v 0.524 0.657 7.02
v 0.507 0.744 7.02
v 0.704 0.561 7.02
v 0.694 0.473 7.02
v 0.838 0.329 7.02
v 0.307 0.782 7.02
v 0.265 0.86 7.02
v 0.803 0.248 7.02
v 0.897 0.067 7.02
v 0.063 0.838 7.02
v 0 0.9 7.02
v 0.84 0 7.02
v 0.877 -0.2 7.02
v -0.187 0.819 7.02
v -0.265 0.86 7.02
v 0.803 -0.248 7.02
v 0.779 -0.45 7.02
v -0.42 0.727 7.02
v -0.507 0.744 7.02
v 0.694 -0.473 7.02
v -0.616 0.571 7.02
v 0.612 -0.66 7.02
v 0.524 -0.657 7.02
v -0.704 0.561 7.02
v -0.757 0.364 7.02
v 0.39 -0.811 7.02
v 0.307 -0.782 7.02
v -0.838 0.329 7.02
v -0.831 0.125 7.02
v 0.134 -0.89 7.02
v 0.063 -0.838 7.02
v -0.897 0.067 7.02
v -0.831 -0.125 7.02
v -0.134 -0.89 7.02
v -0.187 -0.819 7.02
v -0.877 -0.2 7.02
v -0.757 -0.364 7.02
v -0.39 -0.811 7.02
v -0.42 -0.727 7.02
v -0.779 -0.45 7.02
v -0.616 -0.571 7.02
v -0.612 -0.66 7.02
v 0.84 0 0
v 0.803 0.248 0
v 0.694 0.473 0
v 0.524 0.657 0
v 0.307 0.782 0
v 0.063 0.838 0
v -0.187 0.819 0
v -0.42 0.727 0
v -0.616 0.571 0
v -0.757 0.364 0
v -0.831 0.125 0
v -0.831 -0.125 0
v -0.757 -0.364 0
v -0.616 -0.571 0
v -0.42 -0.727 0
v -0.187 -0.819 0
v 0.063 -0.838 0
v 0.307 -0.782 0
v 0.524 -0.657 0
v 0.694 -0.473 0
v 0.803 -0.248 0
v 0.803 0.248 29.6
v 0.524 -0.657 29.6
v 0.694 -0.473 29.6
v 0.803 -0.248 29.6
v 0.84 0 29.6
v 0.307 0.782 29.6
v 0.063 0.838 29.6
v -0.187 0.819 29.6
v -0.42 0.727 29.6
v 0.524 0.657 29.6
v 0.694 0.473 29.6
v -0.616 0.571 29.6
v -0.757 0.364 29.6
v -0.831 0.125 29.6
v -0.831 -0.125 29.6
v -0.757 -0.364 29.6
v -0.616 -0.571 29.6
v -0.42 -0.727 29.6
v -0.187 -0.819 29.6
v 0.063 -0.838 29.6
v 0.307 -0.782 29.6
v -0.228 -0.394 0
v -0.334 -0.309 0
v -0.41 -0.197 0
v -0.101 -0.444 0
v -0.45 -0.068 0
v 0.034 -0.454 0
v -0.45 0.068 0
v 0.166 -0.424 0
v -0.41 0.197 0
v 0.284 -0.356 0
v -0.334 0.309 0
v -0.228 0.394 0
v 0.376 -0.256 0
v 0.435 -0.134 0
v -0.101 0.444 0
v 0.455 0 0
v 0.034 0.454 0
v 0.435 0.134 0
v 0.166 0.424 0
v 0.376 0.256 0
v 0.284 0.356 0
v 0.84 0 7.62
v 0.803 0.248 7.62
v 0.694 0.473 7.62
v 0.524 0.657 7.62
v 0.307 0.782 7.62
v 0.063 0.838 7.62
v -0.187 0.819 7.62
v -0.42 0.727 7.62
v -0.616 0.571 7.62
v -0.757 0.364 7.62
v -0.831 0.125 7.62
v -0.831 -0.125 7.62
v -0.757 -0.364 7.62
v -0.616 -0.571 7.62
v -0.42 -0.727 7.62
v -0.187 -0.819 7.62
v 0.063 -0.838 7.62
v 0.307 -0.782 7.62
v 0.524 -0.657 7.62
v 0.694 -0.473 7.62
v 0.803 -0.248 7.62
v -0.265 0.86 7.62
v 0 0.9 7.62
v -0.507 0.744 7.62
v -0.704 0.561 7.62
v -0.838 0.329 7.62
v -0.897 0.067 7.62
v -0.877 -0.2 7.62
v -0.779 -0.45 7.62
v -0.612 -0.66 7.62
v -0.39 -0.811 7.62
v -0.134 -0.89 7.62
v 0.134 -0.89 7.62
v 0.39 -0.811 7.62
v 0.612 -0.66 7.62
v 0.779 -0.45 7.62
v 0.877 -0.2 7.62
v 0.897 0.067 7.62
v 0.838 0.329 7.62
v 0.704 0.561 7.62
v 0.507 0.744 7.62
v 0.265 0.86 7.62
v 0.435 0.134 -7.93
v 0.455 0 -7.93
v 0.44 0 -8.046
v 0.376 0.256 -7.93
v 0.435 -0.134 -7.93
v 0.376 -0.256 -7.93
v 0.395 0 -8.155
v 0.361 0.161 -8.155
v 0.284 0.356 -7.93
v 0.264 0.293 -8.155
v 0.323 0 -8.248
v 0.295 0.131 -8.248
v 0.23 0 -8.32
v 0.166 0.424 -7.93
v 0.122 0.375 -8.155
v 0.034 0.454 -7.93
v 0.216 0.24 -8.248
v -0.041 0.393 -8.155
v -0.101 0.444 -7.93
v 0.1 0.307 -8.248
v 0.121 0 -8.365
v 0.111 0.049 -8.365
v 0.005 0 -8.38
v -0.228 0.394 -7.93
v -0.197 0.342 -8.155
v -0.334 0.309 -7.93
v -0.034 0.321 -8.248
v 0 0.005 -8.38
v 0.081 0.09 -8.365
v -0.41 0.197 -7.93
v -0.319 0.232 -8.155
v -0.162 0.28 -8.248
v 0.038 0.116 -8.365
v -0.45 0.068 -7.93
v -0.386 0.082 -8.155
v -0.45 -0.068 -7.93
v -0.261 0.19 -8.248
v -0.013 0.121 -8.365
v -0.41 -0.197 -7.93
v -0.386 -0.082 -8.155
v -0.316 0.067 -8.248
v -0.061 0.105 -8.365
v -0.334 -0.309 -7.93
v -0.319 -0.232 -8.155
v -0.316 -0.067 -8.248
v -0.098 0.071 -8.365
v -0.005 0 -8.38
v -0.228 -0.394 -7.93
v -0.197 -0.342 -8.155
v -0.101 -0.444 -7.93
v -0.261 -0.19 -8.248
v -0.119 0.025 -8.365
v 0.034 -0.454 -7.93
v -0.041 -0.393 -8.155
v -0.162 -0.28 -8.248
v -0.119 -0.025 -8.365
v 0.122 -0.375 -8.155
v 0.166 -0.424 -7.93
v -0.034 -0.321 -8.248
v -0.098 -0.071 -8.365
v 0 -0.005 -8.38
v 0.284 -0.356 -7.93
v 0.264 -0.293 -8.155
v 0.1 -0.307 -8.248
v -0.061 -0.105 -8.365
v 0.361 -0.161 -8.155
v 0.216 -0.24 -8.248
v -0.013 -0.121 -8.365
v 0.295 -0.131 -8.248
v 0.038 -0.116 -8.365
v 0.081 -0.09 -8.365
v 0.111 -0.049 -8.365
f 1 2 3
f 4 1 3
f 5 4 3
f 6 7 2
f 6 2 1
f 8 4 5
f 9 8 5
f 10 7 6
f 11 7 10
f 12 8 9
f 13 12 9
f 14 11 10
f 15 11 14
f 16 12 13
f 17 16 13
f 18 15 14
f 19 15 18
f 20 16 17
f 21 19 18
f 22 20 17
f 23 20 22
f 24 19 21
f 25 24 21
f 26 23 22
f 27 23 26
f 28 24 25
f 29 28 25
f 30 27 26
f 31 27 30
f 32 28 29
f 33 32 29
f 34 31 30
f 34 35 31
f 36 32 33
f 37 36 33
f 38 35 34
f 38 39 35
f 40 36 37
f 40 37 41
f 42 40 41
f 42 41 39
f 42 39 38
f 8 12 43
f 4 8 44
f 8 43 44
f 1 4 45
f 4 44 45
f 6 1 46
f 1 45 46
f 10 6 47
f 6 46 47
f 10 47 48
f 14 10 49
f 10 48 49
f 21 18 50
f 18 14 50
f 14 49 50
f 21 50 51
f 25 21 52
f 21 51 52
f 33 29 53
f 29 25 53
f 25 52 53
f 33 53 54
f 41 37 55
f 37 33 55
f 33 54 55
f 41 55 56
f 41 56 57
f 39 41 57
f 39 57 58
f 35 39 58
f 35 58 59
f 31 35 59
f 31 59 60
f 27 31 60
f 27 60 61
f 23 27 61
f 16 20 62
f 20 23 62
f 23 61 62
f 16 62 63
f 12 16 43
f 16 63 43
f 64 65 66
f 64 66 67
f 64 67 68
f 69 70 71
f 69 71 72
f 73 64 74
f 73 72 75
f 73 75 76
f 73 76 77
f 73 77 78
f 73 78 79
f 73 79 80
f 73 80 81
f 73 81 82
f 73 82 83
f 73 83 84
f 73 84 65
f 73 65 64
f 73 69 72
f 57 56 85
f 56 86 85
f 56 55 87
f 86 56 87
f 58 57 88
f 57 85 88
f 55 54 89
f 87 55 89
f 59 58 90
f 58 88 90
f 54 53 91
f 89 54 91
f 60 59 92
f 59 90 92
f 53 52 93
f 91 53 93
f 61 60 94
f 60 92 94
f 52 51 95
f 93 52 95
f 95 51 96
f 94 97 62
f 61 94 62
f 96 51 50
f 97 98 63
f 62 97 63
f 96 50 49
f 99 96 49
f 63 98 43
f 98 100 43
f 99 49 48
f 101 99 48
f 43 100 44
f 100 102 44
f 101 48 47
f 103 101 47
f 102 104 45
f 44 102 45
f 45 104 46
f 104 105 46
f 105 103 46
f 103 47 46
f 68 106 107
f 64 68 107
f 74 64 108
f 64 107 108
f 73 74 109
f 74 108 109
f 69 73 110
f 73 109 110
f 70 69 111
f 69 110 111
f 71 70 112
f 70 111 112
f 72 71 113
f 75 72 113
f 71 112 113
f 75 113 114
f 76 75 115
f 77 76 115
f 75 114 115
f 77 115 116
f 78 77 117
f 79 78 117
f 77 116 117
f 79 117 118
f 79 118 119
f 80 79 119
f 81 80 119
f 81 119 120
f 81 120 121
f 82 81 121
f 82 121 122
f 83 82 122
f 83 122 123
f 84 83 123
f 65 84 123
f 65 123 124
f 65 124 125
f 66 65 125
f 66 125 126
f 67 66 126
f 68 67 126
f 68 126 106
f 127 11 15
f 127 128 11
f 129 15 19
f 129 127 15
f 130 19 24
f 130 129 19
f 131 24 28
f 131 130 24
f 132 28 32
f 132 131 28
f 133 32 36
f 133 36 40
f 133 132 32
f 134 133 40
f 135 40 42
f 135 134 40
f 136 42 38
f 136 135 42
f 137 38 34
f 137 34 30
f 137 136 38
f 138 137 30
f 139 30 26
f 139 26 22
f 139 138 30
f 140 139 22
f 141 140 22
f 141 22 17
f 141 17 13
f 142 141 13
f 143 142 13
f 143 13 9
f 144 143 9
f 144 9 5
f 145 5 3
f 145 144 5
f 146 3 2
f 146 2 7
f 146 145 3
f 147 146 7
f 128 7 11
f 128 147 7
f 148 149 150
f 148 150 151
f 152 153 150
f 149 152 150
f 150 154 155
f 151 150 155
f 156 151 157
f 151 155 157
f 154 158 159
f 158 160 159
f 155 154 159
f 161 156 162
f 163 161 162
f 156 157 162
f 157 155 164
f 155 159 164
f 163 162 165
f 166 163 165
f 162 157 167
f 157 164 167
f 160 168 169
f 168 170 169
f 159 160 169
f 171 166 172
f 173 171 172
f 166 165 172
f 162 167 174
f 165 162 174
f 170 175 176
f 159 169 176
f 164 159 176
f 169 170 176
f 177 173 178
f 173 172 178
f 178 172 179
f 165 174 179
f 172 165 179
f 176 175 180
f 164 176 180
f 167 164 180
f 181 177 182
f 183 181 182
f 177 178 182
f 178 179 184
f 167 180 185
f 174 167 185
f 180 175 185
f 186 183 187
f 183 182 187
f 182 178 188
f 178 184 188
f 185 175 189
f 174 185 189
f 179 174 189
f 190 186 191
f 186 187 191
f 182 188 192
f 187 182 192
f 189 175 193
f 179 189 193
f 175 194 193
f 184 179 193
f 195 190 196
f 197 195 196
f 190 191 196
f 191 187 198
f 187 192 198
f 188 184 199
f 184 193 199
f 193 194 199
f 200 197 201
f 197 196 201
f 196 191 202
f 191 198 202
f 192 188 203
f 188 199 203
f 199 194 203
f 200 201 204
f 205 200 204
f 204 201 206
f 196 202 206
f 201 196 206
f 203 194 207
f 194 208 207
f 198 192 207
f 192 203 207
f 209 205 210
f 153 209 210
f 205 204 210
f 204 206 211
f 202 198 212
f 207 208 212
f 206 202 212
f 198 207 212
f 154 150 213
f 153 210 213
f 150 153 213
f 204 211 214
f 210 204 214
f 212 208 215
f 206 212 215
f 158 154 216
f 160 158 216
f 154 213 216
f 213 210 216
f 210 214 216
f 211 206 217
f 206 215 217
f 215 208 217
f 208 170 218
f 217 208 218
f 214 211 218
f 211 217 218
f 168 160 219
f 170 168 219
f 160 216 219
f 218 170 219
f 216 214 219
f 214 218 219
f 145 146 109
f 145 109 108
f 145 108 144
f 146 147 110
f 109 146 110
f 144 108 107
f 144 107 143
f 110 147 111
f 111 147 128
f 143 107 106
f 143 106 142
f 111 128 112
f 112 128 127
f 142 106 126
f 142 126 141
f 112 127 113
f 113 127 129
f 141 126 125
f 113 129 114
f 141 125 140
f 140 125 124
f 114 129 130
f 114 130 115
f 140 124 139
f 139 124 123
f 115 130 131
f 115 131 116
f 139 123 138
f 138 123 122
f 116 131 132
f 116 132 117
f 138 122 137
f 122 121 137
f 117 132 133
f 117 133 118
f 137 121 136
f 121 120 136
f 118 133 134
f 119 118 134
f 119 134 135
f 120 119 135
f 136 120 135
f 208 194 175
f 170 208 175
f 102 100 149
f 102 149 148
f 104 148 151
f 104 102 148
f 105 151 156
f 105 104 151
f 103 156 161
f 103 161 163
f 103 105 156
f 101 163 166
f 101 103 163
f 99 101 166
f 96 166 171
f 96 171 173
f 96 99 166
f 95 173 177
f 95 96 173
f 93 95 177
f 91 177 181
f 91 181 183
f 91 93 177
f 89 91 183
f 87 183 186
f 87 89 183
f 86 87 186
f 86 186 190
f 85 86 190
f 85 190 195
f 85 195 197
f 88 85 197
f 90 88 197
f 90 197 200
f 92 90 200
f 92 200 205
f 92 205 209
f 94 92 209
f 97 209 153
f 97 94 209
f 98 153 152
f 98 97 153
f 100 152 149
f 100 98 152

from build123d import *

# Parameters (mm, degrees)
F0_R     = 0.84
F1_DEPTH = 29.6
F2_W     = 0.9
F2_H     = 0.6
F4_R     = 0.455
F5_DEPTH = 8.38
F6_R     = 0.45


with BuildPart() as f1:
    # F0 (on Top) → F1 (new body)
    with BuildSketch(Plane.XY):
        Circle(F0_R)
    extrude(amount=F1_DEPTH)

    # F2 (on Right) → F3 (revolve)
    with BuildSketch(Plane.YZ):
        with Locations((0.45, 7.32)):
            Rectangle(F2_W, F2_H)
    revolve(axis=Axis((0, 0, 7.32), (0, 0, 1)))

    # F4 (on Top) → F5 (join)
    with BuildSketch(Plane.XY):
        Circle(F4_R)
    extrude(amount=-F5_DEPTH)

    # F6
    f6_edges = [f1.edges().sort_by_distance(p)[0] for p in [
        (-0.455, 0, -8.38),
    ]]
    fillet(f6_edges, radius=F6_R)


solid = f1.part
